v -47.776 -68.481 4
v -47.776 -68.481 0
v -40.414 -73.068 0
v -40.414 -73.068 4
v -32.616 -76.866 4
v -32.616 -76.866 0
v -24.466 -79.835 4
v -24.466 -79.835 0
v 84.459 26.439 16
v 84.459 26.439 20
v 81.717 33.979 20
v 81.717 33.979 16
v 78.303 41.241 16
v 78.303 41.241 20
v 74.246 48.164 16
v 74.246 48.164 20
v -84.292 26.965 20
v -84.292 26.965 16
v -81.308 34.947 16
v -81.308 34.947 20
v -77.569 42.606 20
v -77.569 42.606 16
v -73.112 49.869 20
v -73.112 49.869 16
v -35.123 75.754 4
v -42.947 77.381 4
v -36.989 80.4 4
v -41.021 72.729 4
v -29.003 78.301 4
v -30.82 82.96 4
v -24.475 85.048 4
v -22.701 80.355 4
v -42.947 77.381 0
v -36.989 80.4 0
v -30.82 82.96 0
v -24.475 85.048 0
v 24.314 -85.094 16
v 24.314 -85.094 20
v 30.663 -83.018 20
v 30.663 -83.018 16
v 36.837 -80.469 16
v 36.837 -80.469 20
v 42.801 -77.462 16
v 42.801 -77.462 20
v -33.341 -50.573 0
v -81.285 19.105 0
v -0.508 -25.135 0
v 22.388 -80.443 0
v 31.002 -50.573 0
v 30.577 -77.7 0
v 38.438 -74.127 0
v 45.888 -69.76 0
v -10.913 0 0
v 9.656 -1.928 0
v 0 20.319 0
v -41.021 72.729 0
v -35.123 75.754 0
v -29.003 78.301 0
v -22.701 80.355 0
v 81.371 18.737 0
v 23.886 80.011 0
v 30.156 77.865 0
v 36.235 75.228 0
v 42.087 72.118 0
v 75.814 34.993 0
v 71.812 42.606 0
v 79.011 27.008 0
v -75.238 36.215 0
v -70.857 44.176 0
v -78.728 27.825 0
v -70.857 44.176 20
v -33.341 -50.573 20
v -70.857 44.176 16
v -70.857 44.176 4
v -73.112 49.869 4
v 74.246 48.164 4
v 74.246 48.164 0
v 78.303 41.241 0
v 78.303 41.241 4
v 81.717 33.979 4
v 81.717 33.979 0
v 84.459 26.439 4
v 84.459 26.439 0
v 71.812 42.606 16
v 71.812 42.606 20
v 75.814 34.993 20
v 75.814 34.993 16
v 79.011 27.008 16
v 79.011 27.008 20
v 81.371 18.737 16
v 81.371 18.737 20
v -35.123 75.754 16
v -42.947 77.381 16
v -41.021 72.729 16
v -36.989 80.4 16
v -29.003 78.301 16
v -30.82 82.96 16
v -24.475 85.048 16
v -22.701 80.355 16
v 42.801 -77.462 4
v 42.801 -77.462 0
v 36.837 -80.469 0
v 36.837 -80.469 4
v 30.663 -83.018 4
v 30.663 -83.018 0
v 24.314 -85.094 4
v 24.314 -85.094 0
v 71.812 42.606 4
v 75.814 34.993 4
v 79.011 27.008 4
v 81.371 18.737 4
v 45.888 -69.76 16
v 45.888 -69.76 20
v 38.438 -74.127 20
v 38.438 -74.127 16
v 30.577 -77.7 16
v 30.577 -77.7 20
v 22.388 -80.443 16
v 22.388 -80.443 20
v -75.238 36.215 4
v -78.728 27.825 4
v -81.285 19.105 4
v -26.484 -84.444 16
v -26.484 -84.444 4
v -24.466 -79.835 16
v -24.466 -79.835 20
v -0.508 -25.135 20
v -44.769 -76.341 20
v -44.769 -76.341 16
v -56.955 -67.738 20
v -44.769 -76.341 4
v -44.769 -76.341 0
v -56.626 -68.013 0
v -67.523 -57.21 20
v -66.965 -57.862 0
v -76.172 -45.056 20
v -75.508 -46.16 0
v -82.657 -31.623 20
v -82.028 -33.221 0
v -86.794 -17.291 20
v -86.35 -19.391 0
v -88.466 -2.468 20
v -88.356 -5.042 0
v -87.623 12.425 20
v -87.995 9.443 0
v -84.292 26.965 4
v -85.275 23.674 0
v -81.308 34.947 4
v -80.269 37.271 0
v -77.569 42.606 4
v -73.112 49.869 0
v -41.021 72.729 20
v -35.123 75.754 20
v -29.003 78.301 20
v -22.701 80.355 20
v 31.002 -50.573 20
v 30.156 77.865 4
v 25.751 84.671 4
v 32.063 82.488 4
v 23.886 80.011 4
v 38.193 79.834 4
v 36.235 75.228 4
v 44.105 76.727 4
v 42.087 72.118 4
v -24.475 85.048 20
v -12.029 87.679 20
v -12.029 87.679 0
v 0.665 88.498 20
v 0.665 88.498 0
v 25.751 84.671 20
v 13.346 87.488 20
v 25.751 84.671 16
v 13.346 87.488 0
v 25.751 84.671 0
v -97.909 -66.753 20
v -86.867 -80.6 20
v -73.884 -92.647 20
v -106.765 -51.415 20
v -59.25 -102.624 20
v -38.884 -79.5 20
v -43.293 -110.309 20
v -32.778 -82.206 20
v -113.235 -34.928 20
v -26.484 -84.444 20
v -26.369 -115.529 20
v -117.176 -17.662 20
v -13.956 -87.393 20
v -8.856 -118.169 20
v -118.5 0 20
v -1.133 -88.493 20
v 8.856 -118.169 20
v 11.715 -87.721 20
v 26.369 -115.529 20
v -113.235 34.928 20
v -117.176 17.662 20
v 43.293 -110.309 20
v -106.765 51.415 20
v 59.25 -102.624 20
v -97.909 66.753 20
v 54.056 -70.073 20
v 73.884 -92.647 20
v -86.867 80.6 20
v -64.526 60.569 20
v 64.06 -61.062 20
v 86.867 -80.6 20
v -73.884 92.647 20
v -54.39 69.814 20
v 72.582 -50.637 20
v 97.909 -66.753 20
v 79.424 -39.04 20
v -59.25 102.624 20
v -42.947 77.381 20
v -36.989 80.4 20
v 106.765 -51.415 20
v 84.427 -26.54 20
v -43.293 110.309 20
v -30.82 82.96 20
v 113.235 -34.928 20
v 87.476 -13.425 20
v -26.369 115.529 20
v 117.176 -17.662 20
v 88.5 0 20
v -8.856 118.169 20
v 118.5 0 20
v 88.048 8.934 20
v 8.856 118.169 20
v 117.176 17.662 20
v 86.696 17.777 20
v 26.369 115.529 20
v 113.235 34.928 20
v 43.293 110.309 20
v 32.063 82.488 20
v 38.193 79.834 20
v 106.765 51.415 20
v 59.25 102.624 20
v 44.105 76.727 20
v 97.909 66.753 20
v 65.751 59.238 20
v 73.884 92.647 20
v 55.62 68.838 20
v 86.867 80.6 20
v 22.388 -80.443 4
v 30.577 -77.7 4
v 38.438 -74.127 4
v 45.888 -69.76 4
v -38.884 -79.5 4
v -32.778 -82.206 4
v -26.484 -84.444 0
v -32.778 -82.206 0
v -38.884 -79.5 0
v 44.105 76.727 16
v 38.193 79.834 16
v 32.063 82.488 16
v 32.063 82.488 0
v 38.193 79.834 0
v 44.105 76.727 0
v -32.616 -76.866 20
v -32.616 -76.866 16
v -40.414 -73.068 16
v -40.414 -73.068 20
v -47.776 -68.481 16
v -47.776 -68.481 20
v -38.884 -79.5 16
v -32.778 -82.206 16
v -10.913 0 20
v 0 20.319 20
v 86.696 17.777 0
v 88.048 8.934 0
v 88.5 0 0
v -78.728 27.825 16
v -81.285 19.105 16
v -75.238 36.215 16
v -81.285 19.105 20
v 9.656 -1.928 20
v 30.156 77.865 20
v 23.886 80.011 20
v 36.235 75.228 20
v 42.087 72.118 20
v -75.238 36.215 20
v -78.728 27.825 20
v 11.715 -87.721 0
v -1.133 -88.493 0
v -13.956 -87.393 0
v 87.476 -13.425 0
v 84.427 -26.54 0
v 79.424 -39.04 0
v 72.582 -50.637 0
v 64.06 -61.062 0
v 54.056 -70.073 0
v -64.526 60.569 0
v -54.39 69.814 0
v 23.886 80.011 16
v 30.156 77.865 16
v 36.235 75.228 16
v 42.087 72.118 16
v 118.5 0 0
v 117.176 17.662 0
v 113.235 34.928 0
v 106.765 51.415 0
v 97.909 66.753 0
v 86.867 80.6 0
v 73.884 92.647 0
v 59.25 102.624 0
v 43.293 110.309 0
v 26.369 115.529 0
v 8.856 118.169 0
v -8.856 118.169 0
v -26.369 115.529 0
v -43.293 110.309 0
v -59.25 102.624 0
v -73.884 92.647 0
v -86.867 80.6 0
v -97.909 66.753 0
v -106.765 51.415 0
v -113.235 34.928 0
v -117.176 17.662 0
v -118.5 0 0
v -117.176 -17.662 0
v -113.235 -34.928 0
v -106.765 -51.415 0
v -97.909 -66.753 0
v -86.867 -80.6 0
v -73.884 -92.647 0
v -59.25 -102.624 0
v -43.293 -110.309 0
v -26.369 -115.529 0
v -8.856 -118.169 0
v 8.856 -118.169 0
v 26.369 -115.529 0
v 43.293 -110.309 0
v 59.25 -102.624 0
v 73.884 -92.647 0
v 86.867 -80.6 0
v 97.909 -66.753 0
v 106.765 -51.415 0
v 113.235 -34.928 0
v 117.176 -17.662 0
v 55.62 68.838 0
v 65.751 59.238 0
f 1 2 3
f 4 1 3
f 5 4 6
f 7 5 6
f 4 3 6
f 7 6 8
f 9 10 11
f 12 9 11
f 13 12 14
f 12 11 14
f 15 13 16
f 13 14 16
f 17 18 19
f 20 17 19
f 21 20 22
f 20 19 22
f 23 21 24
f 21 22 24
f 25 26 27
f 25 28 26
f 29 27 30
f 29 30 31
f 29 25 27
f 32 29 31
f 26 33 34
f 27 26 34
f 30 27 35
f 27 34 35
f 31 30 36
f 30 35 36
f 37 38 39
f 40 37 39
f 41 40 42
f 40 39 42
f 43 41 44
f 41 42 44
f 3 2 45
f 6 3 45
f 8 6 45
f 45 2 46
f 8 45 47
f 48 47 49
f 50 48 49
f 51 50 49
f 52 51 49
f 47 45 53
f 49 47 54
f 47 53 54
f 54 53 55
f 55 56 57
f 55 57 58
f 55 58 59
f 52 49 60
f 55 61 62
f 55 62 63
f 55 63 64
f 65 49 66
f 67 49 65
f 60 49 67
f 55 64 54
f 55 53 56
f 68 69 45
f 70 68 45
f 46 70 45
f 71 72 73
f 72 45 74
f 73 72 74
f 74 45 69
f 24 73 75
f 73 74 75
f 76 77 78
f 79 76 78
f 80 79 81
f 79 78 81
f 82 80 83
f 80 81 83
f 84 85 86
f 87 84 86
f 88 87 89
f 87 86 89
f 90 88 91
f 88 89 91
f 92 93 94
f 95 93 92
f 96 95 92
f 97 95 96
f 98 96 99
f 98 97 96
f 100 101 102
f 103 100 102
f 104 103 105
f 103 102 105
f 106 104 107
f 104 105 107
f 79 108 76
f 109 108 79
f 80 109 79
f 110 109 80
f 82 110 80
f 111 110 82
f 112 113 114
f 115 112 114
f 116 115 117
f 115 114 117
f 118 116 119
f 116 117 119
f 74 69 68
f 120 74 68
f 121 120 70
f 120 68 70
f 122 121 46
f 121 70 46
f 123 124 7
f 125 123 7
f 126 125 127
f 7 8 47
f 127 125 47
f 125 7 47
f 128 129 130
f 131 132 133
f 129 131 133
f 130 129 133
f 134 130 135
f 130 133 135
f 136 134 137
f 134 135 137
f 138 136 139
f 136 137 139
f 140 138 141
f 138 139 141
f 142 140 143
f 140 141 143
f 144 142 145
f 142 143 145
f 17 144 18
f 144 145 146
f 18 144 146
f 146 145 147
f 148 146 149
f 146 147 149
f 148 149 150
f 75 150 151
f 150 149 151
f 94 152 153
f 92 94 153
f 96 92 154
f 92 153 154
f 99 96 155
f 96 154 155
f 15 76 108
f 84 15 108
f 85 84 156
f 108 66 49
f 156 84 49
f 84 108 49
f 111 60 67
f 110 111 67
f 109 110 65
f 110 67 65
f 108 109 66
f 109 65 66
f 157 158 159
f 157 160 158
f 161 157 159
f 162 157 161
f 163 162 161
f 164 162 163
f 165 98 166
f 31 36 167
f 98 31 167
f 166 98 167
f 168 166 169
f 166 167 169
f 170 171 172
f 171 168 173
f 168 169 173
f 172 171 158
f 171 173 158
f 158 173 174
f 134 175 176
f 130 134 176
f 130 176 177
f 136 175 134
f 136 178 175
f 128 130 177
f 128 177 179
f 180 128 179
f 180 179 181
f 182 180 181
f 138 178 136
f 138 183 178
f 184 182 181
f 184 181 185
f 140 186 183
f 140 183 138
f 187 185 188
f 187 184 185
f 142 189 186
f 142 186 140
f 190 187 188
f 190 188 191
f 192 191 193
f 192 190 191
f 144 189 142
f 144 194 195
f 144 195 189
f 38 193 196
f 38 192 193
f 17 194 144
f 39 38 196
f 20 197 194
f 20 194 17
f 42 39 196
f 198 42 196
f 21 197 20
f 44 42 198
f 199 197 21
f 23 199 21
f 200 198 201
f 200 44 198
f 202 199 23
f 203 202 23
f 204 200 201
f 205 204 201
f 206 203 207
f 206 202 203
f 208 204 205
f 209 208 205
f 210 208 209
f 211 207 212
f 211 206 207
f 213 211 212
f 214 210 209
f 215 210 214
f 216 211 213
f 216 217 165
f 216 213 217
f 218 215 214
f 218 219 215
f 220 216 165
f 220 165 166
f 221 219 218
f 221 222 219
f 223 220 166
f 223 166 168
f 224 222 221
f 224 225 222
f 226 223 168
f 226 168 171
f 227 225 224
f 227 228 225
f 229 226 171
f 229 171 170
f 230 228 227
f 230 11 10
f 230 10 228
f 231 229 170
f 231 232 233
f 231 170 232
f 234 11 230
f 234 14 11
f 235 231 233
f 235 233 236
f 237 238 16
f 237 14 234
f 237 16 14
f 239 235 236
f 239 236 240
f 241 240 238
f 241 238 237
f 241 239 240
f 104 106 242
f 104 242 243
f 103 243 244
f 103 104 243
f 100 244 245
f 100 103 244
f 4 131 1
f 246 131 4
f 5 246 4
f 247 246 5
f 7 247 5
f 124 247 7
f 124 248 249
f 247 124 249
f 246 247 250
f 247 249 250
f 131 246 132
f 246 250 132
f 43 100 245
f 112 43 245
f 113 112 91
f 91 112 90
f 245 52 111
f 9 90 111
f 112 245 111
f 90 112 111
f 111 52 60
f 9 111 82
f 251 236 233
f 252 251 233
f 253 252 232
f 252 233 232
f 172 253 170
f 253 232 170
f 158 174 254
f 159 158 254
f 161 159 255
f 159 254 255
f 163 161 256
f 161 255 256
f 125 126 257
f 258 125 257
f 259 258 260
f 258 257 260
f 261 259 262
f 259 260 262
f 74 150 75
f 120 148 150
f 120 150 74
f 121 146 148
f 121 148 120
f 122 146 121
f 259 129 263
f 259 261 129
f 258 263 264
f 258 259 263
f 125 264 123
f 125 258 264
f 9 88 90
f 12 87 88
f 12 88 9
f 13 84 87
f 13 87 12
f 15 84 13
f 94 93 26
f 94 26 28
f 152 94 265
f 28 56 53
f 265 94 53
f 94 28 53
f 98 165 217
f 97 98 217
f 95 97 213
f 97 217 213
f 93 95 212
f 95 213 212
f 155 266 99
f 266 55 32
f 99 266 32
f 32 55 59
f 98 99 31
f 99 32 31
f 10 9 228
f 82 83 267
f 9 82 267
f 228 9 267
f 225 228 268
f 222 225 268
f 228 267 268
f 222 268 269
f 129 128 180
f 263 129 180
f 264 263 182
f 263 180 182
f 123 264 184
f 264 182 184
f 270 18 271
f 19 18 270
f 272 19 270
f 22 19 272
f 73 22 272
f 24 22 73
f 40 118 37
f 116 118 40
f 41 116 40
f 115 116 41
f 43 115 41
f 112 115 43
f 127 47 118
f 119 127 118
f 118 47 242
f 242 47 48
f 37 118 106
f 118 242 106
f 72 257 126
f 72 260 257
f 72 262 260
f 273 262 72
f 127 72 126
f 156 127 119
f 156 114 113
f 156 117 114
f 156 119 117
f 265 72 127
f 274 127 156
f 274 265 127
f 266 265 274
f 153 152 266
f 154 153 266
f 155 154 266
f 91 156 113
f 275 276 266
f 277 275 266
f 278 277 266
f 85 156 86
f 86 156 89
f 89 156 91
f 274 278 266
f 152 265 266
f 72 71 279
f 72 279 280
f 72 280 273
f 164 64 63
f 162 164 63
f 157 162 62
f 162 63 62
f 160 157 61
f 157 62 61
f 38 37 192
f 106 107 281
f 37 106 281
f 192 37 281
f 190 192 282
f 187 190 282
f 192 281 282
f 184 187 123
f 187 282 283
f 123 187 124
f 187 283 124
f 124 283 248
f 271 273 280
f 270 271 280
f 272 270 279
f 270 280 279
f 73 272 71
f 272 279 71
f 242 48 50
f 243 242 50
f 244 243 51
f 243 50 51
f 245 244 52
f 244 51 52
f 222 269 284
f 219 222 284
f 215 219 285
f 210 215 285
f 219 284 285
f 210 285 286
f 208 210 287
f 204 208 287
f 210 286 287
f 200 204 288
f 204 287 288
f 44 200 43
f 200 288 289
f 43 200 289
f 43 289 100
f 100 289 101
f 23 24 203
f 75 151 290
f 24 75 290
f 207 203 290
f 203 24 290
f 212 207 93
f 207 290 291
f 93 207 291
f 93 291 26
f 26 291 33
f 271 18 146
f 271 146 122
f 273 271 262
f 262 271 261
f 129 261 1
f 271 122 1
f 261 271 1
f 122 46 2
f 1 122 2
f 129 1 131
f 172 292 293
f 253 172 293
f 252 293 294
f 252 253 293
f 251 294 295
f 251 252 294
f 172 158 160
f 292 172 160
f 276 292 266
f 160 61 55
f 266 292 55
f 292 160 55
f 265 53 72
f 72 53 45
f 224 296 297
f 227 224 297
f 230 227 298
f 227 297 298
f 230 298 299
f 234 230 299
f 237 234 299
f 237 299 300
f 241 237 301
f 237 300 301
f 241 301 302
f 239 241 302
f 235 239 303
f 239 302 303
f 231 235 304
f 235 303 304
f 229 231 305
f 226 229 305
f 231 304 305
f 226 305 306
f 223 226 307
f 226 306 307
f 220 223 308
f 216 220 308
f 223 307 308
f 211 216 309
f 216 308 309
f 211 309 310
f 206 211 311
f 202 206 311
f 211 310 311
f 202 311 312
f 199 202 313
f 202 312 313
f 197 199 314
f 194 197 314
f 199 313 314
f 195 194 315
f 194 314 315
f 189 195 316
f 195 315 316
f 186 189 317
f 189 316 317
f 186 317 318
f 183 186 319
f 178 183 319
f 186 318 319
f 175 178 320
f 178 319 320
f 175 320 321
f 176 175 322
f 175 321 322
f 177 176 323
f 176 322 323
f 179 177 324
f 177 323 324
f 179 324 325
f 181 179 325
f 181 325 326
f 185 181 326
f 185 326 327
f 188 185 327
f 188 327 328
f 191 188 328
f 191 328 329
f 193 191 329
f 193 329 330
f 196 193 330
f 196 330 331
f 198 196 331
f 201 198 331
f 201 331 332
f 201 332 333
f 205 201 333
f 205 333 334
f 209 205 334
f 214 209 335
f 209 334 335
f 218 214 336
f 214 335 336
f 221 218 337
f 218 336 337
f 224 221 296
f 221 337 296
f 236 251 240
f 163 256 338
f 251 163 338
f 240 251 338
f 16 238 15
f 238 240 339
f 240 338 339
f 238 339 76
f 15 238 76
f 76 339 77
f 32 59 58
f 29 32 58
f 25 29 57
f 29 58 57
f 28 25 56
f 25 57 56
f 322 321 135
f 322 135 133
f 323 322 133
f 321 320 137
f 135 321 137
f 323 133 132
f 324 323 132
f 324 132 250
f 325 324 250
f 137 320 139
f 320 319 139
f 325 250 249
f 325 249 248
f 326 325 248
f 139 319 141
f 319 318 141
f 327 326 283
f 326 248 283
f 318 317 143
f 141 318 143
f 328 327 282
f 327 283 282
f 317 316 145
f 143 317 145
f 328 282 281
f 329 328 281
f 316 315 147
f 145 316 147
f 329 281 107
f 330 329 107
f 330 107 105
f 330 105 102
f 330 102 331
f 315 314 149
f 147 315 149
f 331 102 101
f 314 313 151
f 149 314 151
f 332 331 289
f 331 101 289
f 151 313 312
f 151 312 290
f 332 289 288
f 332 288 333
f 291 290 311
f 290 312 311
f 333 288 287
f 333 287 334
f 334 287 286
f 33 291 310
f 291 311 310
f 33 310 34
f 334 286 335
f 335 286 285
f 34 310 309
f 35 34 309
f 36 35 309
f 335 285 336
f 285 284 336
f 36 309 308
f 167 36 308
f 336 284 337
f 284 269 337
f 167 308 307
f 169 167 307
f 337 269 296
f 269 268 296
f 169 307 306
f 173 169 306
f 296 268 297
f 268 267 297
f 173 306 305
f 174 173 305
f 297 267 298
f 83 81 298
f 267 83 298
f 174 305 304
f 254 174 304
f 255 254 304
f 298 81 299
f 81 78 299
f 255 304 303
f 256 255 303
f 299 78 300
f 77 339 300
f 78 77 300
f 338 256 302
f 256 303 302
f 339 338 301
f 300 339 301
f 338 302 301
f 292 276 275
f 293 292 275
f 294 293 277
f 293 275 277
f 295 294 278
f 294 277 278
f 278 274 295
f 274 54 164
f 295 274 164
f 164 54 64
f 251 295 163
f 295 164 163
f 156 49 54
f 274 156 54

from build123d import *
from build123d import SkipClean  # not in build123d's __all__

# Parameters (mm, degrees)
F0_R     = 118.5
F1_DEPTH = 20
F2_DEPTH = 20
F4_DEPTH = 4
F6_DEPTH = 4


with BuildPart() as f1:
    # F0 (on Top) → F1 (new body)
    with BuildSketch(Plane.XY):
        Circle(F0_R)
        with BuildLine():
            ThreePointArc((84.4585554209, 26.4386538277), (87.4838046576, 13.3728801171), (88.5, 0))
            ThreePointArc((88.5, 0), (76.2236705877, -44.9689008331), (42.8005188217, -77.4620267524))
            ThreePointArc((42.8005188217, -77.4620267524), (33.7736370968, -81.8021481213), (24.3141576643, -85.0944871133))
            ThreePointArc((24.3141576643, -85.0944871133), (-1.1327702213, -88.4927501642), (-26.4843739752, -84.4442297327))
            ThreePointArc((-26.4843739752, -84.4442297327), (-35.8564791301, -80.9108330472), (-44.7693079971, -76.3410706072))
            ThreePointArc((-44.7693079971, -76.3410706072), (-82.6573501675, -31.6229736629), (-84.2920148647, 26.9649073806))
            ThreePointArc((-84.2920148647, 26.9649073806), (-79.5306754268, 38.821664907), (-73.1116226226, 49.869235381))
            ThreePointArc((-73.1116226226, 49.869235381), (-59.6374598942, 65.3882510652), (-42.9470514929, 77.3808811533))
            ThreePointArc((-42.9470514929, 77.3808811533), (-33.9284003129, 81.7380795726), (-24.4751691036, 85.0483162523))
            ThreePointArc((-24.4751691036, 85.0483162523), (0.6651888823, 88.4975000989), (25.7508578518, 84.6707937833))
            ThreePointArc((25.7508578518, 84.6707937833), (35.1532611727, 81.2188292758), (44.1053955412, 76.7265539703))
            ThreePointArc((44.1053955412, 76.7265539703), (60.8748593955, 64.2378509414), (74.2463940977, 48.1635024005))
            ThreePointArc((74.2463940977, 48.1635024005), (80.0924934797, 37.6489374113), (84.4585554209, 26.4386538277))
        make_face(mode=Mode.SUBTRACT)
    extrude(amount=F1_DEPTH)

    # F0 (on Top) → F2 (join)
    with BuildSketch(Plane.XY):
        with BuildLine():
            Line((-84.2920148647, 26.9649073806), (-44.7693079971, -76.3410706072))
            Line((-44.7693079971, -76.3410706072), (-33.3414858158, -50.5729274495))
            Line((-33.3414858158, -50.5729274495), (-73.1116226226, 49.869235381))
            ThreePointArc((-73.1116226226, 49.869235381), (-79.5306754268, 38.821664907), (-84.2920148647, 26.9649073806))
        make_face()
        with BuildLine():
            ThreePointArc((-44.7693079971, -76.3410706072), (-35.8564791301, -80.9108330472), (-26.4843739752, -84.4442297327))
            Line((-26.4843739752, -84.4442297327), (-0.5078915586, -25.1346434059))
            Line((-0.5078915586, -25.1346434059), (-10.9130780509, 0))
            Line((-10.9130780509, 0), (-33.3414858158, -50.5729274495))
            Line((-33.3414858158, -50.5729274495), (-44.7693079971, -76.3410706072))
        make_face()
        with BuildLine():
            Line((9.6563450565, -1.9276264085), (44.1053955412, 76.7265539703))
            ThreePointArc((44.1053955412, 76.7265539703), (35.1532611727, 81.2188292758), (25.7508578518, 84.6707937833))
            Line((25.7508578518, 84.6707937833), (0, 20.3185360879))
            Line((0, 20.3185360879), (-24.4751691036, 85.0483162523))
            ThreePointArc((-24.4751691036, 85.0483162523), (-33.9284003129, 81.7380795726), (-42.9470514929, 77.3808811533))
            Line((-42.9470514929, 77.3808811533), (-10.9130780509, 0))
            Line((-10.9130780509, 0), (-0.5078915586, -25.1346434059))
            Line((-0.5078915586, -25.1346434059), (9.6563450565, -1.9276264085))
        make_face()
        with BuildLine():
            ThreePointArc((24.3141576643, -85.0944871133), (33.7736370968, -81.8021481213), (42.8005188217, -77.4620267524))
            Line((42.8005188217, -77.4620267524), (31.0016963563, -50.5729274495))
            Line((31.0016963563, -50.5729274495), (9.6563450565, -1.9276264085))
            Line((9.6563450565, -1.9276264085), (-0.5078915586, -25.1346434059))
            Line((-0.5078915586, -25.1346434059), (24.3141576643, -85.0944871133))
        make_face()
        with BuildLine():
            Line((42.8005188217, -77.4620267524), (84.4585554209, 26.4386538277))
            ThreePointArc((84.4585554209, 26.4386538277), (80.0924934797, 37.6489374113), (74.2463940977, 48.1635024005))
            Line((74.2463940977, 48.1635024005), (31.0016963563, -50.5729274495))
            Line((31.0016963563, -50.5729274495), (42.8005188217, -77.4620267524))
        make_face()
    extrude(amount=F2_DEPTH)

    # F3 (on face) → F4 (cut)
    with BuildSketch(Plane.XY.offset(20)):
        with BuildLine():
            ThreePointArc((24.3141576643, -85.0944871133), (33.7736370968, -81.8021481213), (42.8005188217, -77.4620267524))
            Line((42.8005188217, -77.4620267524), (45.8884559448, -69.7603011103))
            ThreePointArc((45.8884559448, -69.7603011103), (34.5537158667, -76.0150690311), (22.3883760006, -80.4425920769))
            Line((22.3883760006, -80.4425920769), (24.3141576643, -85.0944871133))
        make_face()
        with BuildLine():
            ThreePointArc((-44.7693079971, -76.3410706072), (-35.8564791301, -80.9108330472), (-26.4843739752, -84.4442297327))
            Line((-26.4843739752, -84.4442297327), (-24.4657542833, -79.8353109053))
            ThreePointArc((-24.4657542833, -79.8353109053), (-36.5644517119, -75.068574457), (-47.7763395541, -68.4811753609))
            Line((-47.7763395541, -68.4811753609), (-44.7693079971, -76.3410706072))
        make_face()
        with BuildLine():
            ThreePointArc((-73.1116226226, 49.869235381), (-79.5306754268, 38.821664907), (-84.2920148647, 26.9649073806))
            Line((-84.2920148647, 26.9649073806), (-81.2849833078, 19.1050121343))
            ThreePointArc((-81.2849833078, 19.1050121343), (-77.0970321509, 32.067080215), (-70.8572793817, 44.1757394803))
            Line((-70.8572793817, 44.1757394803), (-73.1116226226, 49.869235381))
        make_face()
        with BuildLine():
            Line((-22.7005830367, 80.3550466977), (-24.4751691036, 85.0483162523))
            ThreePointArc((-24.4751691036, 85.0483162523), (-33.9284003129, 81.7380795726), (-42.9470514929, 77.3808811533))
            Line((-42.9470514929, 77.3808811533), (-41.0212698292, 72.728986117))
            ThreePointArc((-41.0212698292, 72.728986117), (-32.0882818667, 77.0882102973), (-22.7005830367, 80.3550466977))
        make_face()
        with BuildLine():
            Line((42.0867758493, 72.117635143), (44.1053955412, 76.7265539703))
            ThreePointArc((44.1053955412, 76.7265539703), (35.1532611727, 81.2188292758), (25.7508578518, 84.6707937833))
            Line((25.7508578518, 84.6707937833), (23.8860818979, 80.0106561126))
            ThreePointArc((23.8860818979, 80.0106561126), (33.2216711626, 76.6065960943), (42.0867758493, 72.117635143))
        make_face()
        with BuildLine():
            Line((81.3706182978, 18.7369281856), (84.4585554209, 26.4386538277))
            ThreePointArc((84.4585554209, 26.4386538277), (80.0924934797, 37.6489374113), (74.2463940977, 48.1635024005))
            Line((74.2463940977, 48.1635024005), (71.8122254689, 42.6058009338))
            ThreePointArc((71.8122254689, 42.6058009338), (77.515654404, 31.0414774507), (81.3706182978, 18.7369281856))
        make_face()
    with SkipClean():  # cleaning this boolean's faces spoils the solid; the shape is the same uncleaned
        extrude(amount=-F4_DEPTH, mode=Mode.SUBTRACT)

    # F5 (on face) → F6 (cut)
    with BuildSketch(Plane(origin=(0, 0, 0), x_dir=(1, 0, 0), z_dir=(0, 0, -1))):
        with BuildLine():
            Line((-24.4657542833, 79.8353109053), (-26.4843739752, 84.4442297327))
            ThreePointArc((-26.4843739752, 84.4442297327), (-35.8564791301, 80.9108330472), (-44.7693079971, 76.3410706072))
            Line((-44.7693079971, 76.3410706072), (-47.7763395541, 68.4811753609))
            ThreePointArc((-47.7763395541, 68.4811753609), (-36.5644517119, 75.068574457), (-24.4657542833, 79.8353109053))
        make_face()
        with BuildLine():
            Line((45.8884559448, 69.7603011104), (42.8005188217, 77.4620267524))
            ThreePointArc((42.8005188217, 77.4620267524), (33.7736370968, 81.8021481213), (24.3141576643, 85.0944871133))
            Line((24.3141576643, 85.0944871133), (22.3883760006, 80.4425920769))
            ThreePointArc((22.3883760006, 80.4425920769), (34.5537158667, 76.0150690311), (45.8884559448, 69.7603011103))
        make_face()
        with BuildLine():
            ThreePointArc((74.2463940977, -48.1635024005), (80.0924934797, -37.6489374113), (84.4585554209, -26.4386538277))
            Line((84.4585554209, -26.4386538277), (81.3706182978, -18.7369281856))
            ThreePointArc((81.3706182978, -18.7369281856), (77.515654404, -31.0414774507), (71.8122254689, -42.6058009338))
            Line((71.8122254689, -42.6058009338), (74.2463940977, -48.1635024005))
        make_face()
        with BuildLine():
            ThreePointArc((25.7508578518, -84.6707937833), (35.1532611727, -81.2188292758), (44.1053955412, -76.7265539703))
            Line((44.1053955412, -76.7265539703), (42.0867758493, -72.117635143))
            ThreePointArc((42.0867758493, -72.117635143), (33.2216711626, -76.6065960943), (23.8860818979, -80.0106561126))
            Line((23.8860818979, -80.0106561126), (25.7508578518, -84.6707937833))
        make_face()
        with BuildLine():
            ThreePointArc((-42.9470514929, -77.3808811533), (-33.9284003129, -81.7380795726), (-24.4751691036, -85.0483162523))
            Line((-24.4751691036, -85.0483162523), (-22.7005830367, -80.3550466977))
            ThreePointArc((-22.7005830367, -80.3550466977), (-32.0882818667, -77.0882102973), (-41.0212698292, -72.728986117))
            Line((-41.0212698292, -72.728986117), (-42.9470514929, -77.3808811533))
        make_face()
        with BuildLine():
            Line((-81.2849833078, -19.1050121343), (-84.2920148647, -26.9649073806))
            ThreePointArc((-84.2920148647, -26.9649073806), (-79.5306754268, -38.821664907), (-73.1116226226, -49.869235381))
            Line((-73.1116226226, -49.869235381), (-70.8572793817, -44.1757394803))
            ThreePointArc((-70.8572793817, -44.1757394803), (-77.0970321509, -32.067080215), (-81.2849833078, -19.1050121343))
        make_face()
    extrude(amount=-F6_DEPTH, mode=Mode.SUBTRACT)


solid = f1.part
